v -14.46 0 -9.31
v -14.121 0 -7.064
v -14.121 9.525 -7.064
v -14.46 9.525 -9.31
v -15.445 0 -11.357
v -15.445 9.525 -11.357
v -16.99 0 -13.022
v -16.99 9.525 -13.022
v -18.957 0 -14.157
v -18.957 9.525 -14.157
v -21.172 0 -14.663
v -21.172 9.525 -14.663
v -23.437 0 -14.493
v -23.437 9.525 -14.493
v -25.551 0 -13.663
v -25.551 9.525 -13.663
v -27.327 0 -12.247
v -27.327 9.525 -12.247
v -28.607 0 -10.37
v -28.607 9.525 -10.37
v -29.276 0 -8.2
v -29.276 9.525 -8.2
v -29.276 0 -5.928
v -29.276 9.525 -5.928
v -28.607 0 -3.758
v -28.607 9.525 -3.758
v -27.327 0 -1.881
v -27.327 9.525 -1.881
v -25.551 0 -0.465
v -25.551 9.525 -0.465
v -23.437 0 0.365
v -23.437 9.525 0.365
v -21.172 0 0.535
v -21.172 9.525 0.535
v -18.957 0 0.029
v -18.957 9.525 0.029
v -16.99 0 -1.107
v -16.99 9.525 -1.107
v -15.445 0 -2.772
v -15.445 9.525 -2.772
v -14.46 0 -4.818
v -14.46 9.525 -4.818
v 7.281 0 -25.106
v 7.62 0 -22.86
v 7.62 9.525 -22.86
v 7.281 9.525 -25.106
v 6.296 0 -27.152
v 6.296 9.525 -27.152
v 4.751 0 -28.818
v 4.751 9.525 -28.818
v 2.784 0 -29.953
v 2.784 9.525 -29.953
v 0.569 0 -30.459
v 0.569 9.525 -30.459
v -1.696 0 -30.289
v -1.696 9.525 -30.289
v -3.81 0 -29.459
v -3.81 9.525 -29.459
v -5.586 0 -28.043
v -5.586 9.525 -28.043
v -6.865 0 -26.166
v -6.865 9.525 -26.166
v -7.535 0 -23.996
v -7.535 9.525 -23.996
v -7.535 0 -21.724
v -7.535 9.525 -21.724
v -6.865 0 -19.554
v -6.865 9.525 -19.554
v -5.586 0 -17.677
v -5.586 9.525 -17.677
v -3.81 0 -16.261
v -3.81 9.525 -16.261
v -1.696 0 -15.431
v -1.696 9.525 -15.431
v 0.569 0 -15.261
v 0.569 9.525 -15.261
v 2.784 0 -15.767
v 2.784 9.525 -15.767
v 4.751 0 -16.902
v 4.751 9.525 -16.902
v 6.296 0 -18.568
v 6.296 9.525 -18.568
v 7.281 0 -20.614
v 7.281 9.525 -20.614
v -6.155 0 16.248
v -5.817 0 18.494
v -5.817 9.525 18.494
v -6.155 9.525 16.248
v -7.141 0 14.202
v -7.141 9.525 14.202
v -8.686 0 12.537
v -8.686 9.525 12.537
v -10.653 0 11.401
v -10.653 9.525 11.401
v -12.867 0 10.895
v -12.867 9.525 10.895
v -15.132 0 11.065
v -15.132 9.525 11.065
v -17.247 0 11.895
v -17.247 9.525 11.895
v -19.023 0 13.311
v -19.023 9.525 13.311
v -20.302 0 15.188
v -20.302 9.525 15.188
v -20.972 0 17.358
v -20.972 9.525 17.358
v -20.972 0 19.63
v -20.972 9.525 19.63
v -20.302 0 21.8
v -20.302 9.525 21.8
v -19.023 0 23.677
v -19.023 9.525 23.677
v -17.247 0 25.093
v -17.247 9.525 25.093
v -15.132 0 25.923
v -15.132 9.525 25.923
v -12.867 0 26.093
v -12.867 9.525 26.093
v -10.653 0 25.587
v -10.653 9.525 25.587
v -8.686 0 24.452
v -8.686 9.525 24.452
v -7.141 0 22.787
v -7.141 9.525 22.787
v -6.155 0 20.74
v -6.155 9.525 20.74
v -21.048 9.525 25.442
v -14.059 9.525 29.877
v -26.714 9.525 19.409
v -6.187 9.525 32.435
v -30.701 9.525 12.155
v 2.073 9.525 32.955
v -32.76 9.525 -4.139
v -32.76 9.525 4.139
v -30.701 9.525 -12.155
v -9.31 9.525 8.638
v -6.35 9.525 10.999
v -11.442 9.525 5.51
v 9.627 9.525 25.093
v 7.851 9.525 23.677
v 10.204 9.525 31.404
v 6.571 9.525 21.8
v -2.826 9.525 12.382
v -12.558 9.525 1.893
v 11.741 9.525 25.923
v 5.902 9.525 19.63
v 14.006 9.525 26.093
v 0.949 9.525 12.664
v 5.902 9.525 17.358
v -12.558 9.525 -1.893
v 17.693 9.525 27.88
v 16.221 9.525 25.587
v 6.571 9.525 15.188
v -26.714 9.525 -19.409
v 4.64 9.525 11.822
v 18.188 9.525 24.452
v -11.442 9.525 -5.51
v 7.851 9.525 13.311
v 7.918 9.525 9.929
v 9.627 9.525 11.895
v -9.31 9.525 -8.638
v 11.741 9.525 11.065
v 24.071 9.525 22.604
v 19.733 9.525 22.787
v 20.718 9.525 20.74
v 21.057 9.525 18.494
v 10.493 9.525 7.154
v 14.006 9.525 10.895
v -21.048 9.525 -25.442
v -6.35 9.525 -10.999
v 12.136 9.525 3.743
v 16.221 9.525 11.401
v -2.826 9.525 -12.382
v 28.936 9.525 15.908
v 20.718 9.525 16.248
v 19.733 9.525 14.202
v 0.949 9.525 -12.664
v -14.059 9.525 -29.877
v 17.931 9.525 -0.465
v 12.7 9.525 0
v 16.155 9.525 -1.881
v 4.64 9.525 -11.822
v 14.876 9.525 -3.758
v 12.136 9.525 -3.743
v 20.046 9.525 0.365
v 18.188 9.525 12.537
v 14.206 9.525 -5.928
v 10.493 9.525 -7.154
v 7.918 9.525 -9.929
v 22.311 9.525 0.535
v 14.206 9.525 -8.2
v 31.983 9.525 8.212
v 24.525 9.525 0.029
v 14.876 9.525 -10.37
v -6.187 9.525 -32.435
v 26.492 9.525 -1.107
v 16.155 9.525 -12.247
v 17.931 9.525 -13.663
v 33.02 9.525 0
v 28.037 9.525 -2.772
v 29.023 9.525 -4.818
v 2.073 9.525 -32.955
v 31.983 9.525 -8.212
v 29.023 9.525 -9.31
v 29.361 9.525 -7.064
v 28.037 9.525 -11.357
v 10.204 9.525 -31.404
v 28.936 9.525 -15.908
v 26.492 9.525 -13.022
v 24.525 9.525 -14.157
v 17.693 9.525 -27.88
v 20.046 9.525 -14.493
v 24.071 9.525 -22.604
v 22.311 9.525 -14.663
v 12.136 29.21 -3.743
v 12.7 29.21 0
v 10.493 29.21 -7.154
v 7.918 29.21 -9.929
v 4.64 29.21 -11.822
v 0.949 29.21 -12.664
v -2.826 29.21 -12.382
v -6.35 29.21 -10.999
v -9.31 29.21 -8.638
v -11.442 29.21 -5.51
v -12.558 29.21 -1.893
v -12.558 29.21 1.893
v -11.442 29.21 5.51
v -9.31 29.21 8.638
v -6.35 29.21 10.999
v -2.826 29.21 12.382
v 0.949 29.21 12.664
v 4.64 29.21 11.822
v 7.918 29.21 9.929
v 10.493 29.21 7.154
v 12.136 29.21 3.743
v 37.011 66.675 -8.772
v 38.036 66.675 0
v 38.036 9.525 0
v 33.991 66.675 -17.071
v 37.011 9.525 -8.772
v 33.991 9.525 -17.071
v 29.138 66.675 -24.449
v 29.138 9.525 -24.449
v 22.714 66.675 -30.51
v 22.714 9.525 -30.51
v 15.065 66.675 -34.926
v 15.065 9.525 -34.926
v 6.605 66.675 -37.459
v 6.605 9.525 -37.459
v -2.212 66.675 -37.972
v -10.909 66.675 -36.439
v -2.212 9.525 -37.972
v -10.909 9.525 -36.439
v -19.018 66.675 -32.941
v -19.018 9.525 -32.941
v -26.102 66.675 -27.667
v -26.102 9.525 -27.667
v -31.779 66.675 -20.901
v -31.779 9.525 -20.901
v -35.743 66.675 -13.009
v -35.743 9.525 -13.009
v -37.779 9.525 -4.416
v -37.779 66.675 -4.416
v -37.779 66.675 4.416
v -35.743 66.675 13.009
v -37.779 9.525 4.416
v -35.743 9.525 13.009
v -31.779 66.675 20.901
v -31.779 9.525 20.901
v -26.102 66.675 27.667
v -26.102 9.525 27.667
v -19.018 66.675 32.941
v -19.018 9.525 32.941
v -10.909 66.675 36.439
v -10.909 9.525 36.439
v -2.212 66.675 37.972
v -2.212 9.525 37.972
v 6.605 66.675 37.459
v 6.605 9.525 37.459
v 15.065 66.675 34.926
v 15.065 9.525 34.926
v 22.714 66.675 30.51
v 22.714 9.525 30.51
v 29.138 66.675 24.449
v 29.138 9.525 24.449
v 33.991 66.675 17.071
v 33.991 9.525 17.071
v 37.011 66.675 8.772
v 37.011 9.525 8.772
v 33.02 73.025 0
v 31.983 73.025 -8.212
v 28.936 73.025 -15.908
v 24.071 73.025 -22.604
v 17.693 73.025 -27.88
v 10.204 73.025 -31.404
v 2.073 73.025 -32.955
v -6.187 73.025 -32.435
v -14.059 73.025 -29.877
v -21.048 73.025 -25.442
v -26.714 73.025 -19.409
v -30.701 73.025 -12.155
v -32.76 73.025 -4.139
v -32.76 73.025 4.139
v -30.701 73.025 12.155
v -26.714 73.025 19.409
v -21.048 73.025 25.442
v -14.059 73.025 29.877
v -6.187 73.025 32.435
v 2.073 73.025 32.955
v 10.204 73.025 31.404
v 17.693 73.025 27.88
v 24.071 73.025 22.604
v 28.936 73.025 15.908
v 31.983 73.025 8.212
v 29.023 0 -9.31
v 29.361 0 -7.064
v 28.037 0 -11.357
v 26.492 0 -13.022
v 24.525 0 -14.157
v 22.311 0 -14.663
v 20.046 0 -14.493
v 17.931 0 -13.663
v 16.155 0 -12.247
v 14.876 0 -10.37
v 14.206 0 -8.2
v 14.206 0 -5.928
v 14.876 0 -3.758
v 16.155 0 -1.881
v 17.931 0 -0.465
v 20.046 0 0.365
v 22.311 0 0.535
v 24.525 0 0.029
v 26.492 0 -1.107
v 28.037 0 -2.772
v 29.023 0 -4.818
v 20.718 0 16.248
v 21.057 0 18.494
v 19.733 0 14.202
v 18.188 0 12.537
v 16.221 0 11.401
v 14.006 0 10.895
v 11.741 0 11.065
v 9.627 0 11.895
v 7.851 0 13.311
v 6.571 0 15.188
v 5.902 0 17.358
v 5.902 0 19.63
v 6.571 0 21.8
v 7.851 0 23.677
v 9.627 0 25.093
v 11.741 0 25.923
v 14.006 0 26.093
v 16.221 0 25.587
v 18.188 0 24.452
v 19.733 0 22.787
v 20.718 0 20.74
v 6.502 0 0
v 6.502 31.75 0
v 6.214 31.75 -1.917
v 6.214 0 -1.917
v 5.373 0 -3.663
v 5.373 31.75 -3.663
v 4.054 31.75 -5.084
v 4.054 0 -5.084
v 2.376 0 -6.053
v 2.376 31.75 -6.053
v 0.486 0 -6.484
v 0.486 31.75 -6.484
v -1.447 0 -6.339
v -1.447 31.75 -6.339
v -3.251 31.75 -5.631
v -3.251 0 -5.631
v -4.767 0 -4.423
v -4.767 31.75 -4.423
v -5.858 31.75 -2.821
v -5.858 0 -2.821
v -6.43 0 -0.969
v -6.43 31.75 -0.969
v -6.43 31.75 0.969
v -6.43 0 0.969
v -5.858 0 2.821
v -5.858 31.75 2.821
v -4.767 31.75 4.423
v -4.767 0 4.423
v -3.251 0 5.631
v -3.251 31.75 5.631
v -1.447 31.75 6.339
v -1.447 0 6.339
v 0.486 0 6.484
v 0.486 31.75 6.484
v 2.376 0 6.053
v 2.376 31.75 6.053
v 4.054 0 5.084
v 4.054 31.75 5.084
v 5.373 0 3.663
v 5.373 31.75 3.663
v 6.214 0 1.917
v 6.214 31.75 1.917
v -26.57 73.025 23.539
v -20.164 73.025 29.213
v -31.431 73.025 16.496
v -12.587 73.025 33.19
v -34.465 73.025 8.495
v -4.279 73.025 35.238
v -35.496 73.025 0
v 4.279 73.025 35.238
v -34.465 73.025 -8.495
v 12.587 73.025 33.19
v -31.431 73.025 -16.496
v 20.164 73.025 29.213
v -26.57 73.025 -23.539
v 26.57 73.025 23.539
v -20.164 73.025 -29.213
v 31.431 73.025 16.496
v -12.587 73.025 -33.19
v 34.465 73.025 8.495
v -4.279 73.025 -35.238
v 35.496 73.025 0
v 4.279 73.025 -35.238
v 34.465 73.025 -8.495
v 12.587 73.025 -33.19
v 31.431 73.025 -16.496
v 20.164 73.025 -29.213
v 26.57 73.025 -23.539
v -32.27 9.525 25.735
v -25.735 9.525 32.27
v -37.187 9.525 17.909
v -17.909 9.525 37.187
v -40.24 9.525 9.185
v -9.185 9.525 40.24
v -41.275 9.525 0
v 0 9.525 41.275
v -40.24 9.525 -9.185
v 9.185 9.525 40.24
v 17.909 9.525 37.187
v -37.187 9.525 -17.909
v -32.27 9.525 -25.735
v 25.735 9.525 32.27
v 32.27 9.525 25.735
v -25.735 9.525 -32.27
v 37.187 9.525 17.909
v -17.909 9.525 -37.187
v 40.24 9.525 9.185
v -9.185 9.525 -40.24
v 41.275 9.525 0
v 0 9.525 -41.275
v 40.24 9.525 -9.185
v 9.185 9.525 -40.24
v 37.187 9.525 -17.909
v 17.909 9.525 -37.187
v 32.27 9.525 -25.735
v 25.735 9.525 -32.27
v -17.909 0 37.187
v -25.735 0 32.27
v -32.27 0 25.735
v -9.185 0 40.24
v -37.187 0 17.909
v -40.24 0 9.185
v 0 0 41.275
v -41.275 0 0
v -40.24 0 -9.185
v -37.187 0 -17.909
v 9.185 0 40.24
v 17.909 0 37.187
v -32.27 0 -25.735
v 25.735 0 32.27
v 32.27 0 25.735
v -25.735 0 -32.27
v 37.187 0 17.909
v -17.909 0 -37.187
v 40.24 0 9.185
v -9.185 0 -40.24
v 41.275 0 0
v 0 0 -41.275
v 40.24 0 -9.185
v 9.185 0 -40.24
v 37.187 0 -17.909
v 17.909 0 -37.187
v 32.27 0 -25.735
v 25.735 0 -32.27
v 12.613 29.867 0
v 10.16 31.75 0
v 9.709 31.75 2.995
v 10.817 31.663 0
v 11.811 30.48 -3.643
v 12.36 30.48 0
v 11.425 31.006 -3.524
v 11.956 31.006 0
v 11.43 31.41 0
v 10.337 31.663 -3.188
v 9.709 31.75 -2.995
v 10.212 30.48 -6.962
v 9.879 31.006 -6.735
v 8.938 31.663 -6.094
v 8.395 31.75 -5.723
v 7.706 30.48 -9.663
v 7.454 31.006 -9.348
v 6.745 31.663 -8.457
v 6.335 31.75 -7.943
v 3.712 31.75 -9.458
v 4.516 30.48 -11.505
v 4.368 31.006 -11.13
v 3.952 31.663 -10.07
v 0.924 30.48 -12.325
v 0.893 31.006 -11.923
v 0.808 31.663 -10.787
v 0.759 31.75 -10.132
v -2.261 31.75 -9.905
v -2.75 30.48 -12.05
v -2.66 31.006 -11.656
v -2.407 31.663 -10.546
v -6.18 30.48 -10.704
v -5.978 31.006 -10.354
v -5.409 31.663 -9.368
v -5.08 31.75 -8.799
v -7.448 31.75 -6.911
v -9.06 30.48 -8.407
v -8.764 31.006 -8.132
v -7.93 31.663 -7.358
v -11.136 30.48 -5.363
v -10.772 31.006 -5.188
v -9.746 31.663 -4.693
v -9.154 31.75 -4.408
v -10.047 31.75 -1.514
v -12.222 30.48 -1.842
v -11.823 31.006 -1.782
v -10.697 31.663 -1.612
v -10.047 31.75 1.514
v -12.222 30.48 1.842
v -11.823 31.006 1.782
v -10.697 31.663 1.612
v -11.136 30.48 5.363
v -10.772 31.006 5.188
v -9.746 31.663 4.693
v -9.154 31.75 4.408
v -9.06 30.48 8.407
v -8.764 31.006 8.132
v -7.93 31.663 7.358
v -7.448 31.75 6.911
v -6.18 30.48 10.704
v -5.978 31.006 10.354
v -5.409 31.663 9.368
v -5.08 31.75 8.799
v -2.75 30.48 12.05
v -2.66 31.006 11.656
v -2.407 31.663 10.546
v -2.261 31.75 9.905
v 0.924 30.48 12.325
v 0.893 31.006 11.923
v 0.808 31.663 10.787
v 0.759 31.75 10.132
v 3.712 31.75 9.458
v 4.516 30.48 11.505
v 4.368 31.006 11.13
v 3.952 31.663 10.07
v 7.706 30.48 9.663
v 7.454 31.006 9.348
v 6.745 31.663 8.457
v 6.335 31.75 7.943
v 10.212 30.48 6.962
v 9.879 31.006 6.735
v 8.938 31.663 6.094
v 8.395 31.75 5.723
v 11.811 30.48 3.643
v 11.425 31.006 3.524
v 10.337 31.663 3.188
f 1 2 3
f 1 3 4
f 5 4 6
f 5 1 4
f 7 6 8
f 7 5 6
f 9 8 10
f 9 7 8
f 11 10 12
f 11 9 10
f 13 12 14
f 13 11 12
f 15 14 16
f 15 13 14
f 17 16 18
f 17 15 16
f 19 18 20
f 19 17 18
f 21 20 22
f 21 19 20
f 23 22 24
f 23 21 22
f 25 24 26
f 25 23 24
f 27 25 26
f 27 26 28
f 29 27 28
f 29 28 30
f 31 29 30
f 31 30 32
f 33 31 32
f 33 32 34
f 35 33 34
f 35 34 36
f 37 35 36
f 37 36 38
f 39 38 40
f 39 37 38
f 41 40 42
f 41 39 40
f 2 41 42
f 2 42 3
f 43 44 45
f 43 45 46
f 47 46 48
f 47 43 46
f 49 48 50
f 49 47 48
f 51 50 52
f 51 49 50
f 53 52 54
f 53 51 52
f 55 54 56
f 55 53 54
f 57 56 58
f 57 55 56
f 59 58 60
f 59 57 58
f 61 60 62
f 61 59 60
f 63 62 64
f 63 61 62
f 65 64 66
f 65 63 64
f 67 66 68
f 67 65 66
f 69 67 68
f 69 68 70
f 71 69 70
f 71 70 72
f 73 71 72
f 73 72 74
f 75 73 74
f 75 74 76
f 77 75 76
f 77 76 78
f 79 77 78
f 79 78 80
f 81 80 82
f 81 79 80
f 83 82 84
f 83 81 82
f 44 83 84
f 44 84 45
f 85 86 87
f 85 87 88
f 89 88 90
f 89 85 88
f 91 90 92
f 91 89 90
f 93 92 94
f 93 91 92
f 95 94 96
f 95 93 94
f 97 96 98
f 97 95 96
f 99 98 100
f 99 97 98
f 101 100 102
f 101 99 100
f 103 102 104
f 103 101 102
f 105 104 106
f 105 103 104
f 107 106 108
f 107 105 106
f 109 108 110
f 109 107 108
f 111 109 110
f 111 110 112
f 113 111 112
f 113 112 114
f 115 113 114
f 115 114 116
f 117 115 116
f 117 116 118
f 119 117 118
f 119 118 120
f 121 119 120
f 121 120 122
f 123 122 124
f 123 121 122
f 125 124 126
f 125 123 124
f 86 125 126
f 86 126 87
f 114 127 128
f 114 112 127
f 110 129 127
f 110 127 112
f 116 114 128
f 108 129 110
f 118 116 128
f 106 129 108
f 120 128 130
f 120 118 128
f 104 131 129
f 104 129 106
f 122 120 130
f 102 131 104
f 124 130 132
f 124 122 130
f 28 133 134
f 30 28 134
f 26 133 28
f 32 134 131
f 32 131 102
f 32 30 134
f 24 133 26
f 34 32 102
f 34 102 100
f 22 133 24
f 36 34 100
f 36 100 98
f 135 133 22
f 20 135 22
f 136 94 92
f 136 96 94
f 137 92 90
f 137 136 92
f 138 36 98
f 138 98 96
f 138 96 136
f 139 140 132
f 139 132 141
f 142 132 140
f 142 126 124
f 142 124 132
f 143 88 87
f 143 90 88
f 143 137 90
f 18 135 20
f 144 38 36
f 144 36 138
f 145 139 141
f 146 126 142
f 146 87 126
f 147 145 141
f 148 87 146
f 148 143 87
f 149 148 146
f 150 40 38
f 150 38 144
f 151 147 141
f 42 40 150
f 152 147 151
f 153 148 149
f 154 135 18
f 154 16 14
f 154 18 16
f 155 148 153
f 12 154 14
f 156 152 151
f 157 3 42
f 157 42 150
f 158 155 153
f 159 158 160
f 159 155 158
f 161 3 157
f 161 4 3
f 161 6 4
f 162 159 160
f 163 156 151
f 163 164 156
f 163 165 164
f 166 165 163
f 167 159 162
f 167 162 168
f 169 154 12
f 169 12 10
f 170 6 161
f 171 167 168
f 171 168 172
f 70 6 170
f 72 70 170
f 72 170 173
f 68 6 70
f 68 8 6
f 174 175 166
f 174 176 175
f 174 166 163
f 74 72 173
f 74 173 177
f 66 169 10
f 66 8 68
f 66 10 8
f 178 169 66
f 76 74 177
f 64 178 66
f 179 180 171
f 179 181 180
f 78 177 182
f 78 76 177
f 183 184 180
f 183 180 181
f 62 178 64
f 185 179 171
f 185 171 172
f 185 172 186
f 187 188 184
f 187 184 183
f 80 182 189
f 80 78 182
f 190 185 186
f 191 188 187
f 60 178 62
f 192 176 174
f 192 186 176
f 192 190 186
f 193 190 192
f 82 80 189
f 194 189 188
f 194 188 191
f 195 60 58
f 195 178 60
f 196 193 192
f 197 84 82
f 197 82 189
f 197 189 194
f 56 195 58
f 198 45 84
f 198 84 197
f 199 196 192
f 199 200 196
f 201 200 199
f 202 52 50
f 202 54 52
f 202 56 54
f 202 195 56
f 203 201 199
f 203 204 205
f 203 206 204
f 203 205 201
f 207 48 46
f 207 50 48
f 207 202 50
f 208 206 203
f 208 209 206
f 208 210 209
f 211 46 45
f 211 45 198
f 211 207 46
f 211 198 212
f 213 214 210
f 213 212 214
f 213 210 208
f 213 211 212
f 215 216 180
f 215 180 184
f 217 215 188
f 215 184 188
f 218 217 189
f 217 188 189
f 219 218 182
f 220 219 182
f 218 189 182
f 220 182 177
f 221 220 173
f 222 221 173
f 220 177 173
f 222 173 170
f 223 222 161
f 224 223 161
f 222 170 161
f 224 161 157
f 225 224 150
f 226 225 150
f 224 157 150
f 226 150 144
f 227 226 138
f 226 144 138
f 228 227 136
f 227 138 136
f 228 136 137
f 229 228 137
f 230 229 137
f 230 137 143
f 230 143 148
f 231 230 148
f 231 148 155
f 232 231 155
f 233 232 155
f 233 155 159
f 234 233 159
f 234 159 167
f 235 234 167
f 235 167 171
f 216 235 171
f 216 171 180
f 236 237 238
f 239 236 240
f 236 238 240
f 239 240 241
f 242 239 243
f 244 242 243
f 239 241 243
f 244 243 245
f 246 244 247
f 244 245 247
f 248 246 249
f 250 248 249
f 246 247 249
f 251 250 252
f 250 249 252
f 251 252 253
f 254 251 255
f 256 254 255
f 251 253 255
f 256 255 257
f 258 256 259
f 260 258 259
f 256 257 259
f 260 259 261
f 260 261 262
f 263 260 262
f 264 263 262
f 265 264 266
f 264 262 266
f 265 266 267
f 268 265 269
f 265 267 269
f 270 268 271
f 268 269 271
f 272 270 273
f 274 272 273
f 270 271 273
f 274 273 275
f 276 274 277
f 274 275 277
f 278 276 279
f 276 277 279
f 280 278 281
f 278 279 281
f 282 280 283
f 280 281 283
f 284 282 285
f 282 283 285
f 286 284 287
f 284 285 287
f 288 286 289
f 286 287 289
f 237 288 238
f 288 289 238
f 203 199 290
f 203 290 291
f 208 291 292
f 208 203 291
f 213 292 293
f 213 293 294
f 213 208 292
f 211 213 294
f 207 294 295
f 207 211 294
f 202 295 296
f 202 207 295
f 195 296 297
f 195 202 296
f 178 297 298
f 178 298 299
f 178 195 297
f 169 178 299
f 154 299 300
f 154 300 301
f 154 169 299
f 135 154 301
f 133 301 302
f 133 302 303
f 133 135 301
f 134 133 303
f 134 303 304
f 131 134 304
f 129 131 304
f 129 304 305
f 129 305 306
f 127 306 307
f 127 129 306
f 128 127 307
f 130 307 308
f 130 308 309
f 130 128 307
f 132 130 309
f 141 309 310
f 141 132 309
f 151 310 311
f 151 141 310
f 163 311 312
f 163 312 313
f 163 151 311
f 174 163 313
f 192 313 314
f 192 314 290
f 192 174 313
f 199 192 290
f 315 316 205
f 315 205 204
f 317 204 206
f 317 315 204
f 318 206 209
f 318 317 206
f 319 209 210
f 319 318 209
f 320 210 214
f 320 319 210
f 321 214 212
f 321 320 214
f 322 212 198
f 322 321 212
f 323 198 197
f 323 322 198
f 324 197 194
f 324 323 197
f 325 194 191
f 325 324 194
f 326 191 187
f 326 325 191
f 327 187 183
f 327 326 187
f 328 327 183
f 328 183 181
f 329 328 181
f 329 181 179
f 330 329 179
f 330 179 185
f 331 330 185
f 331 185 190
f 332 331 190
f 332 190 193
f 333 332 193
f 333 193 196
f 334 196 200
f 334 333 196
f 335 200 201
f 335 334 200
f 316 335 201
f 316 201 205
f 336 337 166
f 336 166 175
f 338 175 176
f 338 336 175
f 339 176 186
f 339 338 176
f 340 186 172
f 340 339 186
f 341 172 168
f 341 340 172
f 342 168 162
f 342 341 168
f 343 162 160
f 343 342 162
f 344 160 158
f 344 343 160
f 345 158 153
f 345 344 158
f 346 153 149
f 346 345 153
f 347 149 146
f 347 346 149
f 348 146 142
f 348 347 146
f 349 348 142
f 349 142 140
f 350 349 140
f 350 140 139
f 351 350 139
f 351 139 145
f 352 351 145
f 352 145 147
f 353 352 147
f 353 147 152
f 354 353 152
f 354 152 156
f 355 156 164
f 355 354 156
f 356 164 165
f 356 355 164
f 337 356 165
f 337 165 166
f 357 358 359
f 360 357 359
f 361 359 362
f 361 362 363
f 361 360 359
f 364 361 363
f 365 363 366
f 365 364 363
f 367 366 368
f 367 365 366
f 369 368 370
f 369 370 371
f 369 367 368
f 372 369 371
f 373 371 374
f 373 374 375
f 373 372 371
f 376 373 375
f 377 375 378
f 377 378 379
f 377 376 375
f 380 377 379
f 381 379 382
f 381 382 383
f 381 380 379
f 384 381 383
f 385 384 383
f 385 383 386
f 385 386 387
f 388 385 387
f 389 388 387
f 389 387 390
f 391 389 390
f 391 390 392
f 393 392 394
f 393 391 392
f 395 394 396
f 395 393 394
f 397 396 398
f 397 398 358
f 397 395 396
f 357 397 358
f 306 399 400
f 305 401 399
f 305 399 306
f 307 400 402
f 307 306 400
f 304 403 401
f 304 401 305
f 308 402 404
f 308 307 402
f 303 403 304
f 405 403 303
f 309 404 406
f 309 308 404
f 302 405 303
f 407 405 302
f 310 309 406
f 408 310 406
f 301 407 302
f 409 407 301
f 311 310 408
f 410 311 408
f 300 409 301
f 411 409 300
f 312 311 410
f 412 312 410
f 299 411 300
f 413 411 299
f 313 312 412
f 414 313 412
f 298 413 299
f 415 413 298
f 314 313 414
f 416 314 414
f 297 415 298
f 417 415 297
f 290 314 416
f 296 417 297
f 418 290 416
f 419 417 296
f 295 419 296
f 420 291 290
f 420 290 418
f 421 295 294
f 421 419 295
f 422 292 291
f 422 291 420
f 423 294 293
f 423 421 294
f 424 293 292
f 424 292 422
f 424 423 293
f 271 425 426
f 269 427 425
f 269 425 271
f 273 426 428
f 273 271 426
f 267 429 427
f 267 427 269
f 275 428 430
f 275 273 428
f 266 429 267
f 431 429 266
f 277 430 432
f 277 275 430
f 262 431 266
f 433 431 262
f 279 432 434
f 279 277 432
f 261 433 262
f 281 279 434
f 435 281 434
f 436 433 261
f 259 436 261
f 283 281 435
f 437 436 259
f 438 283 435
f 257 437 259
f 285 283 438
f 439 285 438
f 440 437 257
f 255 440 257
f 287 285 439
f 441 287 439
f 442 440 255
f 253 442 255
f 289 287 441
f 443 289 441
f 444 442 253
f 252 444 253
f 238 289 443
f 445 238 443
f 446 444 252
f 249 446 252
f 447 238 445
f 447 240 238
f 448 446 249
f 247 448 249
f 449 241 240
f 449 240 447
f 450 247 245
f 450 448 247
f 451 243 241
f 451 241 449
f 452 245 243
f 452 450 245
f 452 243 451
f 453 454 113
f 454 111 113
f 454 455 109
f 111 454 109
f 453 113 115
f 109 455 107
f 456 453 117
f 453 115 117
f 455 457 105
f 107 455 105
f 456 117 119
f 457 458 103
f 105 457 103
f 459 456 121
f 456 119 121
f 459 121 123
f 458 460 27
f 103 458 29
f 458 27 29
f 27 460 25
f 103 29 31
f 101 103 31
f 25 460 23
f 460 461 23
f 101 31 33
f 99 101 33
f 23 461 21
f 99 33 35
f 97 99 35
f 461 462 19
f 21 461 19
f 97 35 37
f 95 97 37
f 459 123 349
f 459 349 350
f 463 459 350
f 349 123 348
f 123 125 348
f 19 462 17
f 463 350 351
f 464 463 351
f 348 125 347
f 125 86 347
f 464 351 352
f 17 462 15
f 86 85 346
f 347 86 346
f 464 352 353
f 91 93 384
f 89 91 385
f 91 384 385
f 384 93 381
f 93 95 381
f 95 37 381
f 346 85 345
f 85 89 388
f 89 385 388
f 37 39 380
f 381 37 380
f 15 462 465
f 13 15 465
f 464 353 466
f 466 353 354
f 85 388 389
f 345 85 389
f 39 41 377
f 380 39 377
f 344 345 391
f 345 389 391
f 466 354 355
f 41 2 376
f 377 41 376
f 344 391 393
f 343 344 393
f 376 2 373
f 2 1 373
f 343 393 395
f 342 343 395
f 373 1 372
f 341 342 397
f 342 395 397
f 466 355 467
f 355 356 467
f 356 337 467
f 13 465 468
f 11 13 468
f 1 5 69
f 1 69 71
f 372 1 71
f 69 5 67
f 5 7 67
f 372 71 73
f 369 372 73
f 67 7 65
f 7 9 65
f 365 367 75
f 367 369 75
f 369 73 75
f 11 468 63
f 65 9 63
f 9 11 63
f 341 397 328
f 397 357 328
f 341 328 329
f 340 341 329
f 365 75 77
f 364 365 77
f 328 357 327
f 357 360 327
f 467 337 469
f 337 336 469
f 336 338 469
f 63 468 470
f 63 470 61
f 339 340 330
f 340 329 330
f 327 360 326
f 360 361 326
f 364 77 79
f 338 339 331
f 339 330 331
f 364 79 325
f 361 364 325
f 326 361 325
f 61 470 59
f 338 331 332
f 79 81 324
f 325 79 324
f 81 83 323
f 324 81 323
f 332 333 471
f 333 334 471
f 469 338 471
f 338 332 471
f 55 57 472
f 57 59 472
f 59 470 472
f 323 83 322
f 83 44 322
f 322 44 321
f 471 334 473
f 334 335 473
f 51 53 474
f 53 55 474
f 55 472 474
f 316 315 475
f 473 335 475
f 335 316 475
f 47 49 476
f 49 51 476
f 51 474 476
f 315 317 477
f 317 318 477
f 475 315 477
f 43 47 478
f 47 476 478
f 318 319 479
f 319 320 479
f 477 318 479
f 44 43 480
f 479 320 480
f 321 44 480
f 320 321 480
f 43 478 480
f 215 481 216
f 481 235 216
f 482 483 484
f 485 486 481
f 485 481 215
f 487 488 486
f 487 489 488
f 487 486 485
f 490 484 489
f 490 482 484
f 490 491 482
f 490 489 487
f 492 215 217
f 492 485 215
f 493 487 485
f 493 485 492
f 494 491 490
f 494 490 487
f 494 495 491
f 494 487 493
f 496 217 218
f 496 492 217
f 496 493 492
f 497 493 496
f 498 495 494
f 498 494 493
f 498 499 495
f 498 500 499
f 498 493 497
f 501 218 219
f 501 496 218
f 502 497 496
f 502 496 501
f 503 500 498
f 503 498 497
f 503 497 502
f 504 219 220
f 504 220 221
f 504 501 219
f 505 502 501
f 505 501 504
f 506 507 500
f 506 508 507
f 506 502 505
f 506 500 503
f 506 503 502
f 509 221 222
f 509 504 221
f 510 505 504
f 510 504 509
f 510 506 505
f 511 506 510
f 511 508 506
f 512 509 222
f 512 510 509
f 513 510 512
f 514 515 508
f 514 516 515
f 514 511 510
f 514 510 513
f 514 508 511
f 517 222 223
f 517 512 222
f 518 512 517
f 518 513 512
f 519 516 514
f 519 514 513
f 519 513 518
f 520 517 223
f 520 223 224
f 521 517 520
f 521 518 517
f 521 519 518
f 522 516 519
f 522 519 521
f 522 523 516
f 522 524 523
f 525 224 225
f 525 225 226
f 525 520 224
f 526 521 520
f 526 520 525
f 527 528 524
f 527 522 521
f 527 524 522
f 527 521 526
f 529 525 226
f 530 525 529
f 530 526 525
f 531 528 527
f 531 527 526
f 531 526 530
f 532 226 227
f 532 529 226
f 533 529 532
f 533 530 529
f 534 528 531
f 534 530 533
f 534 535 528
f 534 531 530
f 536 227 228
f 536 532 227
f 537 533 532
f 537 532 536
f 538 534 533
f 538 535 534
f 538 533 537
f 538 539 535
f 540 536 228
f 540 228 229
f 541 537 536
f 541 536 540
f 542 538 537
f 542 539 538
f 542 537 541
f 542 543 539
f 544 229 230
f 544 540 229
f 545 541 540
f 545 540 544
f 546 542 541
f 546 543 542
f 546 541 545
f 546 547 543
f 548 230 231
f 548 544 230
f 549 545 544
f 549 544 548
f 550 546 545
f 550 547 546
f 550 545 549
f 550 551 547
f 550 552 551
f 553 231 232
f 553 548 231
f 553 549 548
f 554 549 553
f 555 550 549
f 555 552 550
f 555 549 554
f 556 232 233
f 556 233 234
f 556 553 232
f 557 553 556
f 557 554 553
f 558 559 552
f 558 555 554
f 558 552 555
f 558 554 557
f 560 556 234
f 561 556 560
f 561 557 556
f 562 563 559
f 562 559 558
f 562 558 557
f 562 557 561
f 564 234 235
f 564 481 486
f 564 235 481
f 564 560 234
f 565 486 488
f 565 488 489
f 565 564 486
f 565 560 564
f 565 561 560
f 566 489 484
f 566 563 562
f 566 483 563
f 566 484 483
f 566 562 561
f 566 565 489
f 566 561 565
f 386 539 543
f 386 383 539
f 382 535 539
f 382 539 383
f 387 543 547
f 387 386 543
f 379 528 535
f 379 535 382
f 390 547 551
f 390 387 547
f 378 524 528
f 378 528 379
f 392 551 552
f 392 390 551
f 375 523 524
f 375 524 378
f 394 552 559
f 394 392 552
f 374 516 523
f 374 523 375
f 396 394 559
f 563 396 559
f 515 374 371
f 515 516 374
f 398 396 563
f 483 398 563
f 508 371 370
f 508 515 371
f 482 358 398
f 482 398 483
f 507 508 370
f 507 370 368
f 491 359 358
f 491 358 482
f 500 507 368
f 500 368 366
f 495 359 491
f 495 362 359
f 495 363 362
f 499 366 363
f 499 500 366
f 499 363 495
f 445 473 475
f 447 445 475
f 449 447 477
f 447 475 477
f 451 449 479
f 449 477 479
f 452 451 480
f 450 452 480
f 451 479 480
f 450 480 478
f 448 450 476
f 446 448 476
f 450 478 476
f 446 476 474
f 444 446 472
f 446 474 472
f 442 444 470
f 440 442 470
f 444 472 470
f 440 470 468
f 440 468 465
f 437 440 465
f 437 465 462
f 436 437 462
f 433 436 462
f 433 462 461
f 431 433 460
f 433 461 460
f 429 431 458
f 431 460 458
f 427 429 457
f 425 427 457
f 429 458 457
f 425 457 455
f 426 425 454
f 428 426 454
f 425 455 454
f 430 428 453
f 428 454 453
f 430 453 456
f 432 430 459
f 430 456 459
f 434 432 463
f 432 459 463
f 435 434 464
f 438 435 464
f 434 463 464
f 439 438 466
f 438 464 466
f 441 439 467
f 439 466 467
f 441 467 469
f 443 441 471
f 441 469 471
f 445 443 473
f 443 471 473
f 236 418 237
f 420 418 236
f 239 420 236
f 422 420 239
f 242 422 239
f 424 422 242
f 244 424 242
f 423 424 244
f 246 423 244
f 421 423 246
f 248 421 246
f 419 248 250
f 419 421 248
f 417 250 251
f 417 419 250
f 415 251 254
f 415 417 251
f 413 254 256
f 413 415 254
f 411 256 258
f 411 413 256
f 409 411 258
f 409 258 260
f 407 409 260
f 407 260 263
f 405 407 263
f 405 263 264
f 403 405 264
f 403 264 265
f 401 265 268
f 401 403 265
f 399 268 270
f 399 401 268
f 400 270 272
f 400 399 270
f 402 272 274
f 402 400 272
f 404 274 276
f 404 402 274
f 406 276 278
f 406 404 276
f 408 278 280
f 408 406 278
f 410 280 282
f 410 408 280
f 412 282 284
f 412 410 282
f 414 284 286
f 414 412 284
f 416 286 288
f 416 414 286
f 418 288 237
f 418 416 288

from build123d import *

# Parameters (mm, degrees)
SKETCH1_R           = 41.275
SKETCH1_R_2         = 6.5024
SKETCH1_R_3         = 7.62
BOSS_EXTRUDE1_DEPTH = 9.525
SKETCH2_R           = 38.0365
SKETCH2_R_2         = 33.02
BOSS_EXTRUDE2_DEPTH = 63.5
SKETCH3_R           = 12.7
SKETCH3_R_2         = 6.5024
BOSS_EXTRUDE3_DEPTH = 15.875
CHAMFER1_SIZE       = 6.35
CHAMFER1_SIZE2      = 2.54
SKETCH4_R           = 12.7
SKETCH4_R_2         = 6.5024
BOSS_EXTRUDE4_DEPTH = 6.35
FILLET1_R           = 2.54


with BuildPart() as part:
    # Sketch1 → Boss-Extrude1 (new body)
    with BuildSketch(Plane(origin=(0, 0, 0), x_dir=(1, 0, 0), z_dir=(0, 1, 0))):
        Circle(SKETCH1_R)
        Circle(SKETCH1_R_2, mode=Mode.SUBTRACT)
        with Locations((0, 22.86)):
            Circle(SKETCH1_R_3, mode=Mode.SUBTRACT)
        with Locations((21.741151963, 7.064128491)):
            Circle(SKETCH1_R_3, mode=Mode.SUBTRACT)
        with Locations((13.436770867, -18.494128491)):
            Circle(SKETCH1_R_3, mode=Mode.SUBTRACT)
        with Locations((-13.436770867, -18.494128491)):
            Circle(SKETCH1_R_3, mode=Mode.SUBTRACT)
        with Locations((-21.741151963, 7.064128491)):
            Circle(SKETCH1_R_3, mode=Mode.SUBTRACT)
    extrude(amount=BOSS_EXTRUDE1_DEPTH)

    # Sketch2 → Boss-Extrude2 (add)
    with BuildSketch(Plane(origin=(0, 9.525, 0), x_dir=(1, 0, 0), z_dir=(0, 1, 0))):
        Circle(SKETCH2_R)
        Circle(SKETCH2_R_2, mode=Mode.SUBTRACT)
    extrude(amount=BOSS_EXTRUDE2_DEPTH)

    # Sketch3 → Boss-Extrude3 (add)
    with BuildSketch(Plane(origin=(0, 9.525, 0), x_dir=(1, 0, 0), z_dir=(0, 1, 0))):
        Circle(SKETCH3_R)
        Circle(SKETCH3_R_2, mode=Mode.SUBTRACT)
    extrude(amount=BOSS_EXTRUDE3_DEPTH)

    # Chamfer1
    chamfer1_edges = [part.edges().sort_by_distance(p)[0] for p in [
        (-38.0365, 73.025, 0),
    ]]
    chamfer1_side = [part.faces().sort_by_distance(p)[0] for p in [
        (-38.0365, 41.275, 0),
    ]]
    chamfer(chamfer1_edges, length=CHAMFER1_SIZE, length2=CHAMFER1_SIZE2, reference=chamfer1_side[0])

    # Sketch4 → Boss-Extrude4 (add)
    with BuildSketch(Plane(origin=(0, 25.4, 0), x_dir=(1, 0, 0), z_dir=(0, 1, 0))):
        Circle(SKETCH4_R)
        Circle(SKETCH4_R_2, mode=Mode.SUBTRACT)
    extrude(amount=BOSS_EXTRUDE4_DEPTH)

    # Fillet1
    fillet1_edges = [part.edges().sort_by_distance(p)[0] for p in [
        (-12.7, 31.75, 0),
    ]]
    fillet(fillet1_edges, radius=FILLET1_R)


solid = part.part
